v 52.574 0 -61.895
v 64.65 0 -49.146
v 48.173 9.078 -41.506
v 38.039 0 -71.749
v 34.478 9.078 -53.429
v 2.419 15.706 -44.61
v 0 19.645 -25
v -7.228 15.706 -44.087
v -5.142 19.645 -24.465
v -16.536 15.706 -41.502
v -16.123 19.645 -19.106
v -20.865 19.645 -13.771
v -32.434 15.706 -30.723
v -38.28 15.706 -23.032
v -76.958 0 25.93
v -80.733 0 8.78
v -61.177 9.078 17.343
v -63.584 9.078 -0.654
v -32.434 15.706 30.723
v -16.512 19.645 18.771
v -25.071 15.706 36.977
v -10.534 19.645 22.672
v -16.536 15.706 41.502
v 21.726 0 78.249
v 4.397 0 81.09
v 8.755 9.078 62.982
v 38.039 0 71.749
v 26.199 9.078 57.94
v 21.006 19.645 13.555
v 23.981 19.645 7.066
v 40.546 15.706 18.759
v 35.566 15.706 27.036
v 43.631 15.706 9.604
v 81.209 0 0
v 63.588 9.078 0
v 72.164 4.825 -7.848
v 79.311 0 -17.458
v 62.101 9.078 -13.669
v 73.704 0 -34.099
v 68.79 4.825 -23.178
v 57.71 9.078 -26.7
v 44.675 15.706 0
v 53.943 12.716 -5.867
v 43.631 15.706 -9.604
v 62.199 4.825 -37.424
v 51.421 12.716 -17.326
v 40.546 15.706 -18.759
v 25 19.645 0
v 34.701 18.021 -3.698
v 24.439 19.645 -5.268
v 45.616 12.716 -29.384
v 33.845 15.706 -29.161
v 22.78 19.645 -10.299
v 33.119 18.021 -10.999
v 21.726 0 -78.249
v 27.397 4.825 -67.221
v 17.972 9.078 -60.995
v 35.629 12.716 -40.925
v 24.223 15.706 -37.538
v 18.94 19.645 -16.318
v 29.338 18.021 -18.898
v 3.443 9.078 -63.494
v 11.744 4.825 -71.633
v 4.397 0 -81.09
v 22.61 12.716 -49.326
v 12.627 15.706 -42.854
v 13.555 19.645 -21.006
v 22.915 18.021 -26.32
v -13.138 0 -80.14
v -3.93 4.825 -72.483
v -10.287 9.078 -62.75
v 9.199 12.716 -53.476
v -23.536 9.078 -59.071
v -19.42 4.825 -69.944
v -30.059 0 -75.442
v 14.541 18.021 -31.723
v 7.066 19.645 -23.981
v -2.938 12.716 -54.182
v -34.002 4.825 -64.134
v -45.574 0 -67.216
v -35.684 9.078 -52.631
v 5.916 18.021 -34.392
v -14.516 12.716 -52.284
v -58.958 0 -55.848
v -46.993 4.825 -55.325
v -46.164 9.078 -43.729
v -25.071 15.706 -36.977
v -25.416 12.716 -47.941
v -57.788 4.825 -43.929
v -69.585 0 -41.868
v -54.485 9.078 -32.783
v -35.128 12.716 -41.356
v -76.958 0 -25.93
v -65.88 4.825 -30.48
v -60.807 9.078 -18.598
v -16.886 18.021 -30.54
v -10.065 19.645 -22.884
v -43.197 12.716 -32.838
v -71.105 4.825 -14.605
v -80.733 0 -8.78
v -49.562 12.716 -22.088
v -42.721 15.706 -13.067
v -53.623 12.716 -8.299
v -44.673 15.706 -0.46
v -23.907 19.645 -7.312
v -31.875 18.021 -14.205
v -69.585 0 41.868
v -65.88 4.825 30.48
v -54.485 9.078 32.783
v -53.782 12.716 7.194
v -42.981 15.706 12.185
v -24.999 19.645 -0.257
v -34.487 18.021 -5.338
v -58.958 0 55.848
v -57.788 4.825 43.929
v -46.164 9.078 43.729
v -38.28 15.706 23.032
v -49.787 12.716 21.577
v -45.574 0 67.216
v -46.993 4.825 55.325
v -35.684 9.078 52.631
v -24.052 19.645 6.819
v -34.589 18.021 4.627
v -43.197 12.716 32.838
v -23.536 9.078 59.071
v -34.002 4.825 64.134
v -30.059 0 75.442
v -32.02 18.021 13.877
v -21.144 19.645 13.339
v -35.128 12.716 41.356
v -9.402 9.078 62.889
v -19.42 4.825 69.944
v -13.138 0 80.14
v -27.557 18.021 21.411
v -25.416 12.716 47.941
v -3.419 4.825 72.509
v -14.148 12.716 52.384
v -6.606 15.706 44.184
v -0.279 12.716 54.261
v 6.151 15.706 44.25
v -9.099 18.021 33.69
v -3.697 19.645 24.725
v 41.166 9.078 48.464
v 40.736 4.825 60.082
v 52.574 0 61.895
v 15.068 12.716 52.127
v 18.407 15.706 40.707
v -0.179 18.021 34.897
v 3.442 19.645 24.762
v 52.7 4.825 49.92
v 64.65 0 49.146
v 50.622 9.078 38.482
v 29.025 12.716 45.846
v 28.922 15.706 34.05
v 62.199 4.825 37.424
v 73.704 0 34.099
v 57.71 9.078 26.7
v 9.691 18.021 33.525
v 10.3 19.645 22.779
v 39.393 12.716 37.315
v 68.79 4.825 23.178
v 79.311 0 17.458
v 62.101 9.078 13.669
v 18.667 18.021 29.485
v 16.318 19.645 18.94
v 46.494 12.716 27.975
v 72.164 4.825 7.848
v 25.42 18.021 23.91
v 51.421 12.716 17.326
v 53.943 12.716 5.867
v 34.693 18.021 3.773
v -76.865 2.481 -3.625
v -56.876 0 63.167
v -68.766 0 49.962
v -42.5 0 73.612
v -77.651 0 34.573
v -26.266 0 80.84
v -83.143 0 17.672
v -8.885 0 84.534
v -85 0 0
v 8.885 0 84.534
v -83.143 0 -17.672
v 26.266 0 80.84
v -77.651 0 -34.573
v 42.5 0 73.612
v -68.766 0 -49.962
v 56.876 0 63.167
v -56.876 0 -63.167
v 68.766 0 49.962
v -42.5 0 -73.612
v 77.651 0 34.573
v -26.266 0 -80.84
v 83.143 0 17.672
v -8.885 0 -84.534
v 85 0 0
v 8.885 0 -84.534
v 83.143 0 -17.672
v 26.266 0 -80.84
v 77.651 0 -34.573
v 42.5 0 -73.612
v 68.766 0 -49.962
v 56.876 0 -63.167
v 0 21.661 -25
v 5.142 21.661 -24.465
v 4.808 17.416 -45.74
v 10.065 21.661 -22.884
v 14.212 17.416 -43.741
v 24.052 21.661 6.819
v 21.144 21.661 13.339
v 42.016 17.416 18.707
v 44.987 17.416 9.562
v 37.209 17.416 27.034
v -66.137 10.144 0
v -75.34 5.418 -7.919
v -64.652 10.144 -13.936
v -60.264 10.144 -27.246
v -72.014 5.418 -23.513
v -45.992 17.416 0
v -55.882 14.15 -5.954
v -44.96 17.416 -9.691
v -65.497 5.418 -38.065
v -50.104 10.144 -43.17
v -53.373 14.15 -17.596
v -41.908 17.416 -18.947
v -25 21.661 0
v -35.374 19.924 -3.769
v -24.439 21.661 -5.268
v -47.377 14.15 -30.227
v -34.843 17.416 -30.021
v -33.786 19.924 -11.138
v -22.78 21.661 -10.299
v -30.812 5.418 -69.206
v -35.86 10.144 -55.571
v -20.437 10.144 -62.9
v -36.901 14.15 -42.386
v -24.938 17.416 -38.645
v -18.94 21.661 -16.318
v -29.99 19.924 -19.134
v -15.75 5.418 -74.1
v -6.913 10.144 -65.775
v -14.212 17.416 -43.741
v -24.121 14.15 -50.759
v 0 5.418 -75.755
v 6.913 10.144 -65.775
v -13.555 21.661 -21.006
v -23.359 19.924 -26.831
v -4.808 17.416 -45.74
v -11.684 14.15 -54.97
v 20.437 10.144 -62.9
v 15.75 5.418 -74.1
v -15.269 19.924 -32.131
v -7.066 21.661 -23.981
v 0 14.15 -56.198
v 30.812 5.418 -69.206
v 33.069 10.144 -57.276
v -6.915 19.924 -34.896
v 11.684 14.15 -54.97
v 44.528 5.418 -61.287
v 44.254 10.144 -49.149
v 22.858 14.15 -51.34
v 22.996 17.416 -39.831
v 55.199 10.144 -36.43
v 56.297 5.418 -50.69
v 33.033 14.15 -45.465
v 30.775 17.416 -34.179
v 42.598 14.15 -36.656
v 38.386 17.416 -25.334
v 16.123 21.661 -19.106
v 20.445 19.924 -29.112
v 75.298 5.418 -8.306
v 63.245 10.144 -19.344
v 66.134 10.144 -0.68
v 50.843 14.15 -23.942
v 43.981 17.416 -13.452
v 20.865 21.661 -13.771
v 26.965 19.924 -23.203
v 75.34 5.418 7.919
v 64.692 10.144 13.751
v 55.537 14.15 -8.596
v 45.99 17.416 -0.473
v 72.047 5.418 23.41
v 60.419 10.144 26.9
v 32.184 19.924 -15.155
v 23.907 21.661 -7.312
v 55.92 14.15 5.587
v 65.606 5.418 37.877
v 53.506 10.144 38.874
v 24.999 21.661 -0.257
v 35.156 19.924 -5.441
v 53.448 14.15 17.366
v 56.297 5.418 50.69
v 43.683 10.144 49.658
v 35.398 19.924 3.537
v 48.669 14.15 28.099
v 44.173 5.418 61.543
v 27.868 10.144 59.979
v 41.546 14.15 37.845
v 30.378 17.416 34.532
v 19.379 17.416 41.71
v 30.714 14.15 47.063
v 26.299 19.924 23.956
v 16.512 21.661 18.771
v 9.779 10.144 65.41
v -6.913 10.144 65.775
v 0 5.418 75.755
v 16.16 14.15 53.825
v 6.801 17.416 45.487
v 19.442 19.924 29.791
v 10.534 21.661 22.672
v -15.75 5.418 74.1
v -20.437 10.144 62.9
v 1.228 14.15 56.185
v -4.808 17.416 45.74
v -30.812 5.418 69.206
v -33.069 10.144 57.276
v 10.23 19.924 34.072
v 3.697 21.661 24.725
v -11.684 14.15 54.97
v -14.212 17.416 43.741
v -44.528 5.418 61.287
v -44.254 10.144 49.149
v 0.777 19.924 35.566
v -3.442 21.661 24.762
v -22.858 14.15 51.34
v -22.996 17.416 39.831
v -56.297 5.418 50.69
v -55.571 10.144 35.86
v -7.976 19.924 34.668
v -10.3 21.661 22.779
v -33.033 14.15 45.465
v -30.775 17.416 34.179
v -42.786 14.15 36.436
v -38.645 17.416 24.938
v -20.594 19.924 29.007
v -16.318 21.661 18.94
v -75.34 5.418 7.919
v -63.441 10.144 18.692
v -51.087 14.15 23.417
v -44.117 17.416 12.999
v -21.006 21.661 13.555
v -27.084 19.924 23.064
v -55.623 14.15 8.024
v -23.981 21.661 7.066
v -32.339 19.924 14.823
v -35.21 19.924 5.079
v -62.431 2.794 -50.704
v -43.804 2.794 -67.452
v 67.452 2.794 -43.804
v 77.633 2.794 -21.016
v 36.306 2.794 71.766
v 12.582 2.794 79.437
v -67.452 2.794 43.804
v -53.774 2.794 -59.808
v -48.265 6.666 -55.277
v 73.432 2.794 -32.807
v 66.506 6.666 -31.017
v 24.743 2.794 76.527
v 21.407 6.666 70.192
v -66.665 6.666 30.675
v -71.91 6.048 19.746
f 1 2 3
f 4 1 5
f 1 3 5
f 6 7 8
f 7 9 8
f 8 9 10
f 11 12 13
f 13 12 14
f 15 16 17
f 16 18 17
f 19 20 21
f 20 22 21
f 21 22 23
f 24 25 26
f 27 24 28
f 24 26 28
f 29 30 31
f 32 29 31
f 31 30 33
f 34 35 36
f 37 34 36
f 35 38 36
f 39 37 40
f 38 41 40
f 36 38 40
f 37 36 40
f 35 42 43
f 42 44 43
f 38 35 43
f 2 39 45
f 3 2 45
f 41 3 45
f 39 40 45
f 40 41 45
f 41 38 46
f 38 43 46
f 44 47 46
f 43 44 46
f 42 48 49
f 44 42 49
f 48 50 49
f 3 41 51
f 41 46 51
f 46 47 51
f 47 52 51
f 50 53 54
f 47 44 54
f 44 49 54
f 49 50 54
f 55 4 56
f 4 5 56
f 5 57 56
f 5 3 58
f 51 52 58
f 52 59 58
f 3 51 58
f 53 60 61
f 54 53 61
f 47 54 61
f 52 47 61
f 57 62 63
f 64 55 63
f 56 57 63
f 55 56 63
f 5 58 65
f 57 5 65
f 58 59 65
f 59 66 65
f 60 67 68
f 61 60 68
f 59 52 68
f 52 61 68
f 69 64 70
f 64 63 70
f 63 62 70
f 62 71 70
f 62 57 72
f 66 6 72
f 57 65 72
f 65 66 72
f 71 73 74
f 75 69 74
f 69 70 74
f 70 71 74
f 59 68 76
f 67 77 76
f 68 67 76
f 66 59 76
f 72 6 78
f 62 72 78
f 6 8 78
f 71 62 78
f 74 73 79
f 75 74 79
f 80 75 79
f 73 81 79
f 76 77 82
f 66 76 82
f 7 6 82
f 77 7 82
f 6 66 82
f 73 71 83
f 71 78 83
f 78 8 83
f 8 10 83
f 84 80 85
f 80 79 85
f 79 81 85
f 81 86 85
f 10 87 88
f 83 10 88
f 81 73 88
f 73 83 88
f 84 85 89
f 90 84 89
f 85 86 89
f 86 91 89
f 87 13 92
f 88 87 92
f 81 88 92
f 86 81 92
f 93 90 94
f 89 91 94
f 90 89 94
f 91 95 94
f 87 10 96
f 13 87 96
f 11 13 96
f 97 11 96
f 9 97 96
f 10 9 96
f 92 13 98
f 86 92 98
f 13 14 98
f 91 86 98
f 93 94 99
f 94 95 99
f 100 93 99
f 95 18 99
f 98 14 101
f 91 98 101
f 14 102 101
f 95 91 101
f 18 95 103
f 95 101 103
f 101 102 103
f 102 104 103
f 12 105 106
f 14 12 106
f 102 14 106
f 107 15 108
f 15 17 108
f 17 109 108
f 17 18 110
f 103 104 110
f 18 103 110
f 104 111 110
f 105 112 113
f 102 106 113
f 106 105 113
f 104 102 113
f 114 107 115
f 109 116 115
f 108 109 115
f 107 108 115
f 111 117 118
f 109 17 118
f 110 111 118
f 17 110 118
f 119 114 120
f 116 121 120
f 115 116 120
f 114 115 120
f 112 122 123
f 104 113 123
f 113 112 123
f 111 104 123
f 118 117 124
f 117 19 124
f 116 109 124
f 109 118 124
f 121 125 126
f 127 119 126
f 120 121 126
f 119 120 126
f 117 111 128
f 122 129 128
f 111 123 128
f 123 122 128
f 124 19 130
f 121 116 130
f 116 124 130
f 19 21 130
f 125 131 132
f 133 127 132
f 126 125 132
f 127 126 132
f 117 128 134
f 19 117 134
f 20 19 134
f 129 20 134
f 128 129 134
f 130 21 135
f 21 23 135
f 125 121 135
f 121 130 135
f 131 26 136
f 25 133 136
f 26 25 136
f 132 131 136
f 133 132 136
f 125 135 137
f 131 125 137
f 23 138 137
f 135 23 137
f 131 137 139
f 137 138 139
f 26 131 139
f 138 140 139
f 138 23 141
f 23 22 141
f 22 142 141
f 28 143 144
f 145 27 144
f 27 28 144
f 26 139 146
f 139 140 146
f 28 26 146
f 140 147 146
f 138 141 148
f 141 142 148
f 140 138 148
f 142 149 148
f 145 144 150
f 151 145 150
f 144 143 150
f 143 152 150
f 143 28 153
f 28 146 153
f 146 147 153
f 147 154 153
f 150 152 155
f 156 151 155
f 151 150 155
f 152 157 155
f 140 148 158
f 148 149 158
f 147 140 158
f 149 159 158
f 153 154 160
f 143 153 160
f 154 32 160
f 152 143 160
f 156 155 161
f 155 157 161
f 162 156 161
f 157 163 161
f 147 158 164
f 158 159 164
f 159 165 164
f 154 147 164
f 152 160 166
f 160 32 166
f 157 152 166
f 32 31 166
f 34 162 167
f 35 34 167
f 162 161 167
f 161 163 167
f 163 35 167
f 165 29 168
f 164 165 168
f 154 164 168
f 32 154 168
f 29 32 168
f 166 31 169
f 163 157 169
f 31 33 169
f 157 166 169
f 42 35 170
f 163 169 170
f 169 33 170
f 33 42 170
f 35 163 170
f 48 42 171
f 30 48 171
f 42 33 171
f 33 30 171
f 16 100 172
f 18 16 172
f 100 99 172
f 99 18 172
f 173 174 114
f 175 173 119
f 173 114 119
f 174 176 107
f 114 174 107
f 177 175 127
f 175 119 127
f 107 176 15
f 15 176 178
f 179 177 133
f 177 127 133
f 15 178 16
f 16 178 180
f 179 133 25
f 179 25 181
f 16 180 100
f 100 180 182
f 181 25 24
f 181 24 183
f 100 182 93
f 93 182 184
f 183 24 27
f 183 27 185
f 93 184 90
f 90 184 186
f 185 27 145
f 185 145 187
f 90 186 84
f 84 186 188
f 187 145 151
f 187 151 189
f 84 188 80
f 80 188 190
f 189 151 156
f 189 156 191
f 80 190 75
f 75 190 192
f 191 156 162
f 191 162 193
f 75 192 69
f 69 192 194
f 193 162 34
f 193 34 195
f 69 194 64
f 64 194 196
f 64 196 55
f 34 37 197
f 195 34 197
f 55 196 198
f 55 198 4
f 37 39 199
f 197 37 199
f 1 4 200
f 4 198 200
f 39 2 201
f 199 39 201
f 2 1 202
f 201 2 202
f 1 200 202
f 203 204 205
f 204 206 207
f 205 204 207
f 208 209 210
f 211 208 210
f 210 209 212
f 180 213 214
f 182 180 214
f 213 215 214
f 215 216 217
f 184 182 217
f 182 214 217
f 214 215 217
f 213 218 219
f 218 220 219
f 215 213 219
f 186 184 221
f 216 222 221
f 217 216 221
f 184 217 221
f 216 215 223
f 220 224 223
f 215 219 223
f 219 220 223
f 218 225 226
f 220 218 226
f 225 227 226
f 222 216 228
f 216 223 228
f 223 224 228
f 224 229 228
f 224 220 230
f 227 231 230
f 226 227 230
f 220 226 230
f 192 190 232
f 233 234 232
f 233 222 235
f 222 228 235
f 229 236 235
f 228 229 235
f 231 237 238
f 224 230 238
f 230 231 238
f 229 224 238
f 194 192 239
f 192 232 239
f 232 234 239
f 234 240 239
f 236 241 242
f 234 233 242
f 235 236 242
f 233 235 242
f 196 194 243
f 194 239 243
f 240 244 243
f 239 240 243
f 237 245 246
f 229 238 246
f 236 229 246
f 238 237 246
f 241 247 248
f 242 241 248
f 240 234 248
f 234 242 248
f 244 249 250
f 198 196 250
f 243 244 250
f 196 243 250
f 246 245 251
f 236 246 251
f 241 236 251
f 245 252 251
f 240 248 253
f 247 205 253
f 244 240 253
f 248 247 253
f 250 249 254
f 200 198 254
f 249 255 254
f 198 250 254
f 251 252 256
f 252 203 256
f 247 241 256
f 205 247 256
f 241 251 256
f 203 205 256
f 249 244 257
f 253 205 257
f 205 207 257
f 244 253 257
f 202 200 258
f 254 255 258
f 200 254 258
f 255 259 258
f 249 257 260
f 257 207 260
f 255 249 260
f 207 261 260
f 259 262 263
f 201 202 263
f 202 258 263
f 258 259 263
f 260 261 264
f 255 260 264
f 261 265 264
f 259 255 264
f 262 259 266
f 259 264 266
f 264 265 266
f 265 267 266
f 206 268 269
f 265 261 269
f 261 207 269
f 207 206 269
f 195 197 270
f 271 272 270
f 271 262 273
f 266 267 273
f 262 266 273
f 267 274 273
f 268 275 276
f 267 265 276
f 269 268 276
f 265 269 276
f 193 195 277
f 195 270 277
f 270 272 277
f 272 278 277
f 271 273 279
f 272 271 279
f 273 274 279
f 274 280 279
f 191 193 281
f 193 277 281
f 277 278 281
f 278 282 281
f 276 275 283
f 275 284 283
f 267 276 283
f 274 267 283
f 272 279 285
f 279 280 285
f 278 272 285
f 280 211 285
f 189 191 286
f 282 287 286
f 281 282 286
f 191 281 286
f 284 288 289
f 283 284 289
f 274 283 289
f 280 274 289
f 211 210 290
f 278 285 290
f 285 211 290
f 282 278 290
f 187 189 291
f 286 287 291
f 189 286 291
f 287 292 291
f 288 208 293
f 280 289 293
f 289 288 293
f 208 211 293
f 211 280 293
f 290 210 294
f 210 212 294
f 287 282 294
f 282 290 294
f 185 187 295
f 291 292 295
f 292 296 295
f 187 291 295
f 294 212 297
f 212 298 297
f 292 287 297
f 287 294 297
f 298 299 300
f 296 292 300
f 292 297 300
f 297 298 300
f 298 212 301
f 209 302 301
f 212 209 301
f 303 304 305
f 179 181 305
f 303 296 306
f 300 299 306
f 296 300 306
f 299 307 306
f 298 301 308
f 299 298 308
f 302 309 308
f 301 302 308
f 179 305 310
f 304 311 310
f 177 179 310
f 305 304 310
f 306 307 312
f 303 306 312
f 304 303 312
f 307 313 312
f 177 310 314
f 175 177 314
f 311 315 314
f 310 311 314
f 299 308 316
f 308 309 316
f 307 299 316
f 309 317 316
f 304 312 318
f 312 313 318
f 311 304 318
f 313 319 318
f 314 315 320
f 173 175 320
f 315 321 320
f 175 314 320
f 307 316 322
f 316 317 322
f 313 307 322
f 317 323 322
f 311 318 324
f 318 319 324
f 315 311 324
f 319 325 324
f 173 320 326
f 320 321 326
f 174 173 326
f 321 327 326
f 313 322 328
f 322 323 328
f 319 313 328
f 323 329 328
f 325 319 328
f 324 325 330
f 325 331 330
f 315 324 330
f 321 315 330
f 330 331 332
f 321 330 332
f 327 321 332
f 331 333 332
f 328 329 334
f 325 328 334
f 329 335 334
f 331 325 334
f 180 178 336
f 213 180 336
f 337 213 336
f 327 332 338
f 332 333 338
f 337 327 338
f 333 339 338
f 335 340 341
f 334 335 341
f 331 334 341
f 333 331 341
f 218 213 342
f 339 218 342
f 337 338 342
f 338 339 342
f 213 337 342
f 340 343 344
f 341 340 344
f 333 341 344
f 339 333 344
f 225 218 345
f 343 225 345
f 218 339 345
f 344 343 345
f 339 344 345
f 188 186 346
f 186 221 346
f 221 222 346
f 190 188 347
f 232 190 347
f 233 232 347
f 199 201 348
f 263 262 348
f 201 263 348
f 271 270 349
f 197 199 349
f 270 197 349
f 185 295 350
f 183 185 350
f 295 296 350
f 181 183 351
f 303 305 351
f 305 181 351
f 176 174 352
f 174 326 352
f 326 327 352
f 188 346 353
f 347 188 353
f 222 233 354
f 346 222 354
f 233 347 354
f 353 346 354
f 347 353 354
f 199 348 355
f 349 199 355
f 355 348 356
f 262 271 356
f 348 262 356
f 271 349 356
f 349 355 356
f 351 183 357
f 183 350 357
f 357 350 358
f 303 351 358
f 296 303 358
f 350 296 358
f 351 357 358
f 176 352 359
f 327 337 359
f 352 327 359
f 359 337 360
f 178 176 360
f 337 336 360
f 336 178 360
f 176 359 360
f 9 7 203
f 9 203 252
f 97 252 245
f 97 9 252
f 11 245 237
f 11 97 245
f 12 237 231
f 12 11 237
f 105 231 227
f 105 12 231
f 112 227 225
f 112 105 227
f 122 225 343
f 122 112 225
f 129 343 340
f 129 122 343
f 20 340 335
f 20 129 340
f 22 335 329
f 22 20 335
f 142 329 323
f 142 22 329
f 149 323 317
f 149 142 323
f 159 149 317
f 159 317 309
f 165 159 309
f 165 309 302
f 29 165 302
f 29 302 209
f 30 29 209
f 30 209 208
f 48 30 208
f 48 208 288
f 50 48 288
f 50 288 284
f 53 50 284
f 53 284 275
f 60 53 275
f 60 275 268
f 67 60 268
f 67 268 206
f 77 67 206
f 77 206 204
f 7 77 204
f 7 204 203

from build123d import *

# Parameters (mm, degrees)
SKETCH4_R          = 25
CUT_EXTRUDE1_DEPTH = 37.574958191


# Read off the part's stored shape, not the designer's step: Shell4
with BuildPart() as part:
    # Sketch2 → Revolve3 (revolve)
    with BuildSketch(Plane.XY):
        with BuildLine():
            ThreePointArc((-85, 0), (-44.249157481, 17.892673888), (0, 22.666666667))
            Line((0, 22.666666667), (0, 0))
            Line((0, 0), (-85, 0))
        make_face()
    revolve(axis=Axis((0, 22.666666667, 0), (0, -1, 0)))

    # Shell4 outline → Shell4 (revolve, cut)
    with BuildSketch(Plane.XY):
        with BuildLine():
            Line((0, 0), (81.209332356, 0))
            add(Edge.make_bspline(
                [(81.209332356, 0), (68.010422844, 7.99521566), (53.461432942, 14.388290113), (37.997575401, 18.722433384), (22.188288082, 20.818693148), (5.322203728, 20.818693133), (3.987860722, 20.803180878), (2.655815078, 20.772246575), (1.326414656, 20.725996375), (0, 20.664551338)],
                knots=[1.026160926, 1.026160926, 1.026160926, 1.026160926, 1.026160926, 1.026160926, 1.570268783, 1.570268783, 1.570268783, 1.570268783, 1.617087387, 1.617087387, 1.617087387, 1.617087387, 1.617087387, 1.617087387], degree=5, weights=[1, 1, 0.999461009, 0.999454119, 1, 1, 0.999999976, 0.999999977, 1, 1]))
            Line((0, 20.664551338), (0, 0))
        make_face()
    revolve(axis=Axis((0, 0, 0), (0, 1, 0)), mode=Mode.SUBTRACT)

    # Sketch4 → Cut-Extrude1 (cut)
    with BuildSketch(Plane(origin=(0, 0, 0), x_dir=(1, 0, 0), z_dir=(0, 1, 0))):
        with Locations(Location((0, 0, 0), (0, 0, 90))):
            Circle(SKETCH4_R)
    extrude(amount=CUT_EXTRUDE1_DEPTH, mode=Mode.SUBTRACT)


solid = part.part
